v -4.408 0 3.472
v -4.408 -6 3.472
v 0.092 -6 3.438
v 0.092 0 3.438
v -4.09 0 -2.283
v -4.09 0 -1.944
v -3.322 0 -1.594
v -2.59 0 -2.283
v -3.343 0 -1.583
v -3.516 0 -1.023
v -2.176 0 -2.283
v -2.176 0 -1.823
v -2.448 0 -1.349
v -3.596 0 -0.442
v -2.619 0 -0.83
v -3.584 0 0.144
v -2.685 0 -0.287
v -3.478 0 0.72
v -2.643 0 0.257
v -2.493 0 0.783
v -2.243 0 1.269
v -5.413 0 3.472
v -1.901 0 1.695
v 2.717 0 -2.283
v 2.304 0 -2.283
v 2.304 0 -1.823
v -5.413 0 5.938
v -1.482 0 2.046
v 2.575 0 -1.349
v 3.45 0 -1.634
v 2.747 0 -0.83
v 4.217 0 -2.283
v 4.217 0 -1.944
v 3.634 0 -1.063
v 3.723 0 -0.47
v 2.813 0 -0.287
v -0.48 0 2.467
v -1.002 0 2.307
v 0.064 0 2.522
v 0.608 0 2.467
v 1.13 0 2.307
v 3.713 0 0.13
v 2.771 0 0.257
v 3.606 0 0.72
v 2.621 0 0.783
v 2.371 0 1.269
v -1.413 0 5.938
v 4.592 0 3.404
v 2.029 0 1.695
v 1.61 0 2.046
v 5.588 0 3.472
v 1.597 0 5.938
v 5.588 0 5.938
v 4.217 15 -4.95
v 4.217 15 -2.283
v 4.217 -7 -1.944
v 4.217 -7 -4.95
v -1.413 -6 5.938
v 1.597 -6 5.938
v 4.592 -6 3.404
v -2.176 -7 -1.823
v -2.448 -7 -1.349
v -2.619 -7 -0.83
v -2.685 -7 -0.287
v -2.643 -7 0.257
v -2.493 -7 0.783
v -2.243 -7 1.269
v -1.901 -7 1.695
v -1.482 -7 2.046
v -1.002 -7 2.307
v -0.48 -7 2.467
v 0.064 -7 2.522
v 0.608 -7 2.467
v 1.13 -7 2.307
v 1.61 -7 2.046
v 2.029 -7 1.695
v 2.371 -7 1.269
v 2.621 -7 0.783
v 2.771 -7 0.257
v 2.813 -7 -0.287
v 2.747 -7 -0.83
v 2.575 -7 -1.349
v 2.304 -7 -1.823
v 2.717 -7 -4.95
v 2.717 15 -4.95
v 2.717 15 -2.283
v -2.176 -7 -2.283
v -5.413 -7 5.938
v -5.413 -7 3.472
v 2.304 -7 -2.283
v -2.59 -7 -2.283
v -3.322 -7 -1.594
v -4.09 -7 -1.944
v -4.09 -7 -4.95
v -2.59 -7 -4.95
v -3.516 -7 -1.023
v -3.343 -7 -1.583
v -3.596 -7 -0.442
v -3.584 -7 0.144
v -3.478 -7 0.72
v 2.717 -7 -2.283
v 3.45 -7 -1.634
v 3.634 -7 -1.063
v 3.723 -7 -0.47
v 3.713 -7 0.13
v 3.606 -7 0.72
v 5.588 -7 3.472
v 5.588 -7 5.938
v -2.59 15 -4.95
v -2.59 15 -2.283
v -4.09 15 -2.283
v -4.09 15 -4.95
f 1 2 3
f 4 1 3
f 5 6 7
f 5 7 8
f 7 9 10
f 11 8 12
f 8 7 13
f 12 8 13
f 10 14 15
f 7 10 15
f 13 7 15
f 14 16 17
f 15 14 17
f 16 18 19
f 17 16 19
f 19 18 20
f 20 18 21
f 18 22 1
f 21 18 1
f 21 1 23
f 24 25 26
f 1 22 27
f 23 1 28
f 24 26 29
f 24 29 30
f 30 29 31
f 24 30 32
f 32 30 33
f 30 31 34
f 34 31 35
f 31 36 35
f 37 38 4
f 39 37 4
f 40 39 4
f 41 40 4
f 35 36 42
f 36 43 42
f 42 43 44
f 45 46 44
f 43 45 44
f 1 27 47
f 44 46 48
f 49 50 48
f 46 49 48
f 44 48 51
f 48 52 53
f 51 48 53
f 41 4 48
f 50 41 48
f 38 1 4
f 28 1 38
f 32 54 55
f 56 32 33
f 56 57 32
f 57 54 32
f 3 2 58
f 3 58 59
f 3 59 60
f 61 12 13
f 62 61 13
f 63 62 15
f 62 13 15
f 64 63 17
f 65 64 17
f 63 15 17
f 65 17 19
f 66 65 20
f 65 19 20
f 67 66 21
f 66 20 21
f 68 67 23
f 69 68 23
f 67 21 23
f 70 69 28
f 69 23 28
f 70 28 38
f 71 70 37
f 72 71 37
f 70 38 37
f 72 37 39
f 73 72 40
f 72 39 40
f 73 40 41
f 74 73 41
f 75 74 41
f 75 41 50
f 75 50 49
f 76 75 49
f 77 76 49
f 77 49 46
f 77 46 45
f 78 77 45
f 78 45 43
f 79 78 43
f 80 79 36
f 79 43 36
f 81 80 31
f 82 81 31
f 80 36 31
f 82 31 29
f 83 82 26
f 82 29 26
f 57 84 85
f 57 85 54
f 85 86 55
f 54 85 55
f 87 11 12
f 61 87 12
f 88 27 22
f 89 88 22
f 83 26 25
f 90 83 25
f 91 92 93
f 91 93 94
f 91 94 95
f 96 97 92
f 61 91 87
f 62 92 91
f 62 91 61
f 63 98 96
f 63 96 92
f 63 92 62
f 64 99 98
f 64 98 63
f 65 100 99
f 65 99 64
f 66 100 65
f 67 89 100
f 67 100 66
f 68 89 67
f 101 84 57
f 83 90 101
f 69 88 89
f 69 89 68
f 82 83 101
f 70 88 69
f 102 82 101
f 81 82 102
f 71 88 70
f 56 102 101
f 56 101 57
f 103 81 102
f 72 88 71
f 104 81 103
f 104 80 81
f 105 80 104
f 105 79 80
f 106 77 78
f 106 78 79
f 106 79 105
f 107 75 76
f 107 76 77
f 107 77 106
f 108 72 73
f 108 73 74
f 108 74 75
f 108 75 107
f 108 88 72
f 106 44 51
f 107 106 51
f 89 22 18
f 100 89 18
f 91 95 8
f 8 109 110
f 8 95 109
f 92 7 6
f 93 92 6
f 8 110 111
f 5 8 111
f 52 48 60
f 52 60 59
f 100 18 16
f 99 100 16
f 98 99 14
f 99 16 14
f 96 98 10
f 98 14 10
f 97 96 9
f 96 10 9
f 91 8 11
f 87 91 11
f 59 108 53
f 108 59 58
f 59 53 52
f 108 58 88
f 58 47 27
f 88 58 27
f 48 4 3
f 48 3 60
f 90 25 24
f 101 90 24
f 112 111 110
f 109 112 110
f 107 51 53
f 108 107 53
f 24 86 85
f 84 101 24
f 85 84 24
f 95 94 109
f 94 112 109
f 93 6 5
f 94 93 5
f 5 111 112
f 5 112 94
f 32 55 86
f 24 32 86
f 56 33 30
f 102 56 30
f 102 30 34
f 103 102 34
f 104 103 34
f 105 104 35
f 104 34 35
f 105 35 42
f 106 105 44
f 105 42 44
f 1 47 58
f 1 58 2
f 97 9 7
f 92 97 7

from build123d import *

# Parameters (mm, degrees)
F1_DEPTH = 7
F2_DEPTH = 6
F3_DEPTH = 15


with BuildPart() as f1:
    # F0 (on Front) → F1 (new body)
    with BuildSketch(Plane.XZ):
        with BuildLine():
            ThreePointArc((-3.477884, 0.719832), (-3.596369, -0.44229), (-3.343322, -1.5827))
            Line((-3.343322, -1.5827), (-3.322458, -1.593981))
            Line((-3.322458, -1.593981), (-3.322458, -2.283465))
            Line((-3.322458, -2.283465), (-2.589551, -2.283465))
            Line((-2.589551, -2.283465), (-2.176465, -2.283465))
            Line((-2.176465, -2.283465), (-2.176465, -1.823074))
            ThreePointArc((-2.176465, -1.823074), (0.063946, 2.521621), (2.304358, -1.823074))
            Line((2.304358, -1.823074), (2.304358, -2.283465))
            Line((2.304358, -2.283465), (2.717444, -2.283465))
            Line((2.717444, -2.283465), (3.450351, -2.283465))
            Line((3.450351, -2.283465), (3.450351, -1.634055))
            ThreePointArc((3.450351, -1.634055), (3.72254, -0.469953), (3.605777, 0.719832))
            ThreePointArc((3.605777, 0.719832), (2.307299, 2.6718), (0.091662, 3.438077))
            ThreePointArc((0.091662, 3.438077), (-2.157419, 2.688675), (-3.477884, 0.719832))
        make_face()
        Polygon((-3.322458, -2.283465), (-3.322458, -1.593981), (-4.089551, -1.943924), (-4.089551, -2.283465), align=None)
        with BuildLine():
            Line((-5.413338, 3.472093), (-3.477884, 0.719832))
            ThreePointArc((-3.477884, 0.719832), (-2.157419, 2.688675), (0.091662, 3.438077))
            Line((0.091662, 3.438077), (-4.408209, 3.472093))
            Line((-4.408209, 3.472093), (-1.413338, 5.938077))
            Line((-1.413338, 5.938077), (-5.413338, 5.938077))
            Line((-5.413338, 5.938077), (-5.413338, 3.472093))
        make_face()
        Polygon((-2.589551, -2.283465), (-3.322458, -2.283465), (-4.089551, -2.283465), (-4.089551, -4.949721), (-3.322458, -4.949721), (-2.589551, -4.949721), align=None)
        with BuildLine():
            Line((4.591534, 3.404061), (0.091662, 3.438077))
            ThreePointArc((0.091662, 3.438077), (2.307299, 2.6718), (3.605777, 0.719832))
            Line((3.605777, 0.719832), (5.587751, 3.472093))
            Line((5.587751, 3.472093), (5.587751, 5.938077))
            Line((5.587751, 5.938077), (1.596662, 5.938077))
            Line((1.596662, 5.938077), (4.591534, 3.404061))
        make_face()
        Polygon((-4.408209, 3.472093), (0.091662, 3.438077), (4.591534, 3.404061), (1.596662, 5.938077), (-1.413338, 5.938077), align=None)
        Polygon((4.217444, -1.943924), (3.450351, -1.634055), (3.450351, -2.283465), (4.217444, -2.283465), align=None)
        Polygon((4.217444, -2.283465), (3.450351, -2.283465), (2.717444, -2.283465), (2.717444, -4.949721), (3.450351, -4.949721), (4.217444, -4.949721), align=None)
    extrude(amount=F1_DEPTH)

    # F0 (on Front) → F2 (cut)
    with BuildSketch(Plane.XZ):
        Polygon((-4.408209, 3.472093), (0.091662, 3.438077), (4.591534, 3.404061), (1.596662, 5.938077), (-1.413338, 5.938077), align=None)
    extrude(amount=F2_DEPTH, mode=Mode.SUBTRACT)

    # F0 (on Front) → F3 (join)
    with BuildSketch(Plane.XZ):
        Polygon((4.217444, -2.283465), (3.450351, -2.283465), (2.717444, -2.283465), (2.717444, -4.949721), (3.450351, -4.949721), (4.217444, -4.949721), align=None)
        Polygon((-2.589551, -2.283465), (-3.322458, -2.283465), (-4.089551, -2.283465), (-4.089551, -4.949721), (-3.322458, -4.949721), (-2.589551, -4.949721), align=None)
    extrude(amount=-F3_DEPTH)


solid = f1.part
